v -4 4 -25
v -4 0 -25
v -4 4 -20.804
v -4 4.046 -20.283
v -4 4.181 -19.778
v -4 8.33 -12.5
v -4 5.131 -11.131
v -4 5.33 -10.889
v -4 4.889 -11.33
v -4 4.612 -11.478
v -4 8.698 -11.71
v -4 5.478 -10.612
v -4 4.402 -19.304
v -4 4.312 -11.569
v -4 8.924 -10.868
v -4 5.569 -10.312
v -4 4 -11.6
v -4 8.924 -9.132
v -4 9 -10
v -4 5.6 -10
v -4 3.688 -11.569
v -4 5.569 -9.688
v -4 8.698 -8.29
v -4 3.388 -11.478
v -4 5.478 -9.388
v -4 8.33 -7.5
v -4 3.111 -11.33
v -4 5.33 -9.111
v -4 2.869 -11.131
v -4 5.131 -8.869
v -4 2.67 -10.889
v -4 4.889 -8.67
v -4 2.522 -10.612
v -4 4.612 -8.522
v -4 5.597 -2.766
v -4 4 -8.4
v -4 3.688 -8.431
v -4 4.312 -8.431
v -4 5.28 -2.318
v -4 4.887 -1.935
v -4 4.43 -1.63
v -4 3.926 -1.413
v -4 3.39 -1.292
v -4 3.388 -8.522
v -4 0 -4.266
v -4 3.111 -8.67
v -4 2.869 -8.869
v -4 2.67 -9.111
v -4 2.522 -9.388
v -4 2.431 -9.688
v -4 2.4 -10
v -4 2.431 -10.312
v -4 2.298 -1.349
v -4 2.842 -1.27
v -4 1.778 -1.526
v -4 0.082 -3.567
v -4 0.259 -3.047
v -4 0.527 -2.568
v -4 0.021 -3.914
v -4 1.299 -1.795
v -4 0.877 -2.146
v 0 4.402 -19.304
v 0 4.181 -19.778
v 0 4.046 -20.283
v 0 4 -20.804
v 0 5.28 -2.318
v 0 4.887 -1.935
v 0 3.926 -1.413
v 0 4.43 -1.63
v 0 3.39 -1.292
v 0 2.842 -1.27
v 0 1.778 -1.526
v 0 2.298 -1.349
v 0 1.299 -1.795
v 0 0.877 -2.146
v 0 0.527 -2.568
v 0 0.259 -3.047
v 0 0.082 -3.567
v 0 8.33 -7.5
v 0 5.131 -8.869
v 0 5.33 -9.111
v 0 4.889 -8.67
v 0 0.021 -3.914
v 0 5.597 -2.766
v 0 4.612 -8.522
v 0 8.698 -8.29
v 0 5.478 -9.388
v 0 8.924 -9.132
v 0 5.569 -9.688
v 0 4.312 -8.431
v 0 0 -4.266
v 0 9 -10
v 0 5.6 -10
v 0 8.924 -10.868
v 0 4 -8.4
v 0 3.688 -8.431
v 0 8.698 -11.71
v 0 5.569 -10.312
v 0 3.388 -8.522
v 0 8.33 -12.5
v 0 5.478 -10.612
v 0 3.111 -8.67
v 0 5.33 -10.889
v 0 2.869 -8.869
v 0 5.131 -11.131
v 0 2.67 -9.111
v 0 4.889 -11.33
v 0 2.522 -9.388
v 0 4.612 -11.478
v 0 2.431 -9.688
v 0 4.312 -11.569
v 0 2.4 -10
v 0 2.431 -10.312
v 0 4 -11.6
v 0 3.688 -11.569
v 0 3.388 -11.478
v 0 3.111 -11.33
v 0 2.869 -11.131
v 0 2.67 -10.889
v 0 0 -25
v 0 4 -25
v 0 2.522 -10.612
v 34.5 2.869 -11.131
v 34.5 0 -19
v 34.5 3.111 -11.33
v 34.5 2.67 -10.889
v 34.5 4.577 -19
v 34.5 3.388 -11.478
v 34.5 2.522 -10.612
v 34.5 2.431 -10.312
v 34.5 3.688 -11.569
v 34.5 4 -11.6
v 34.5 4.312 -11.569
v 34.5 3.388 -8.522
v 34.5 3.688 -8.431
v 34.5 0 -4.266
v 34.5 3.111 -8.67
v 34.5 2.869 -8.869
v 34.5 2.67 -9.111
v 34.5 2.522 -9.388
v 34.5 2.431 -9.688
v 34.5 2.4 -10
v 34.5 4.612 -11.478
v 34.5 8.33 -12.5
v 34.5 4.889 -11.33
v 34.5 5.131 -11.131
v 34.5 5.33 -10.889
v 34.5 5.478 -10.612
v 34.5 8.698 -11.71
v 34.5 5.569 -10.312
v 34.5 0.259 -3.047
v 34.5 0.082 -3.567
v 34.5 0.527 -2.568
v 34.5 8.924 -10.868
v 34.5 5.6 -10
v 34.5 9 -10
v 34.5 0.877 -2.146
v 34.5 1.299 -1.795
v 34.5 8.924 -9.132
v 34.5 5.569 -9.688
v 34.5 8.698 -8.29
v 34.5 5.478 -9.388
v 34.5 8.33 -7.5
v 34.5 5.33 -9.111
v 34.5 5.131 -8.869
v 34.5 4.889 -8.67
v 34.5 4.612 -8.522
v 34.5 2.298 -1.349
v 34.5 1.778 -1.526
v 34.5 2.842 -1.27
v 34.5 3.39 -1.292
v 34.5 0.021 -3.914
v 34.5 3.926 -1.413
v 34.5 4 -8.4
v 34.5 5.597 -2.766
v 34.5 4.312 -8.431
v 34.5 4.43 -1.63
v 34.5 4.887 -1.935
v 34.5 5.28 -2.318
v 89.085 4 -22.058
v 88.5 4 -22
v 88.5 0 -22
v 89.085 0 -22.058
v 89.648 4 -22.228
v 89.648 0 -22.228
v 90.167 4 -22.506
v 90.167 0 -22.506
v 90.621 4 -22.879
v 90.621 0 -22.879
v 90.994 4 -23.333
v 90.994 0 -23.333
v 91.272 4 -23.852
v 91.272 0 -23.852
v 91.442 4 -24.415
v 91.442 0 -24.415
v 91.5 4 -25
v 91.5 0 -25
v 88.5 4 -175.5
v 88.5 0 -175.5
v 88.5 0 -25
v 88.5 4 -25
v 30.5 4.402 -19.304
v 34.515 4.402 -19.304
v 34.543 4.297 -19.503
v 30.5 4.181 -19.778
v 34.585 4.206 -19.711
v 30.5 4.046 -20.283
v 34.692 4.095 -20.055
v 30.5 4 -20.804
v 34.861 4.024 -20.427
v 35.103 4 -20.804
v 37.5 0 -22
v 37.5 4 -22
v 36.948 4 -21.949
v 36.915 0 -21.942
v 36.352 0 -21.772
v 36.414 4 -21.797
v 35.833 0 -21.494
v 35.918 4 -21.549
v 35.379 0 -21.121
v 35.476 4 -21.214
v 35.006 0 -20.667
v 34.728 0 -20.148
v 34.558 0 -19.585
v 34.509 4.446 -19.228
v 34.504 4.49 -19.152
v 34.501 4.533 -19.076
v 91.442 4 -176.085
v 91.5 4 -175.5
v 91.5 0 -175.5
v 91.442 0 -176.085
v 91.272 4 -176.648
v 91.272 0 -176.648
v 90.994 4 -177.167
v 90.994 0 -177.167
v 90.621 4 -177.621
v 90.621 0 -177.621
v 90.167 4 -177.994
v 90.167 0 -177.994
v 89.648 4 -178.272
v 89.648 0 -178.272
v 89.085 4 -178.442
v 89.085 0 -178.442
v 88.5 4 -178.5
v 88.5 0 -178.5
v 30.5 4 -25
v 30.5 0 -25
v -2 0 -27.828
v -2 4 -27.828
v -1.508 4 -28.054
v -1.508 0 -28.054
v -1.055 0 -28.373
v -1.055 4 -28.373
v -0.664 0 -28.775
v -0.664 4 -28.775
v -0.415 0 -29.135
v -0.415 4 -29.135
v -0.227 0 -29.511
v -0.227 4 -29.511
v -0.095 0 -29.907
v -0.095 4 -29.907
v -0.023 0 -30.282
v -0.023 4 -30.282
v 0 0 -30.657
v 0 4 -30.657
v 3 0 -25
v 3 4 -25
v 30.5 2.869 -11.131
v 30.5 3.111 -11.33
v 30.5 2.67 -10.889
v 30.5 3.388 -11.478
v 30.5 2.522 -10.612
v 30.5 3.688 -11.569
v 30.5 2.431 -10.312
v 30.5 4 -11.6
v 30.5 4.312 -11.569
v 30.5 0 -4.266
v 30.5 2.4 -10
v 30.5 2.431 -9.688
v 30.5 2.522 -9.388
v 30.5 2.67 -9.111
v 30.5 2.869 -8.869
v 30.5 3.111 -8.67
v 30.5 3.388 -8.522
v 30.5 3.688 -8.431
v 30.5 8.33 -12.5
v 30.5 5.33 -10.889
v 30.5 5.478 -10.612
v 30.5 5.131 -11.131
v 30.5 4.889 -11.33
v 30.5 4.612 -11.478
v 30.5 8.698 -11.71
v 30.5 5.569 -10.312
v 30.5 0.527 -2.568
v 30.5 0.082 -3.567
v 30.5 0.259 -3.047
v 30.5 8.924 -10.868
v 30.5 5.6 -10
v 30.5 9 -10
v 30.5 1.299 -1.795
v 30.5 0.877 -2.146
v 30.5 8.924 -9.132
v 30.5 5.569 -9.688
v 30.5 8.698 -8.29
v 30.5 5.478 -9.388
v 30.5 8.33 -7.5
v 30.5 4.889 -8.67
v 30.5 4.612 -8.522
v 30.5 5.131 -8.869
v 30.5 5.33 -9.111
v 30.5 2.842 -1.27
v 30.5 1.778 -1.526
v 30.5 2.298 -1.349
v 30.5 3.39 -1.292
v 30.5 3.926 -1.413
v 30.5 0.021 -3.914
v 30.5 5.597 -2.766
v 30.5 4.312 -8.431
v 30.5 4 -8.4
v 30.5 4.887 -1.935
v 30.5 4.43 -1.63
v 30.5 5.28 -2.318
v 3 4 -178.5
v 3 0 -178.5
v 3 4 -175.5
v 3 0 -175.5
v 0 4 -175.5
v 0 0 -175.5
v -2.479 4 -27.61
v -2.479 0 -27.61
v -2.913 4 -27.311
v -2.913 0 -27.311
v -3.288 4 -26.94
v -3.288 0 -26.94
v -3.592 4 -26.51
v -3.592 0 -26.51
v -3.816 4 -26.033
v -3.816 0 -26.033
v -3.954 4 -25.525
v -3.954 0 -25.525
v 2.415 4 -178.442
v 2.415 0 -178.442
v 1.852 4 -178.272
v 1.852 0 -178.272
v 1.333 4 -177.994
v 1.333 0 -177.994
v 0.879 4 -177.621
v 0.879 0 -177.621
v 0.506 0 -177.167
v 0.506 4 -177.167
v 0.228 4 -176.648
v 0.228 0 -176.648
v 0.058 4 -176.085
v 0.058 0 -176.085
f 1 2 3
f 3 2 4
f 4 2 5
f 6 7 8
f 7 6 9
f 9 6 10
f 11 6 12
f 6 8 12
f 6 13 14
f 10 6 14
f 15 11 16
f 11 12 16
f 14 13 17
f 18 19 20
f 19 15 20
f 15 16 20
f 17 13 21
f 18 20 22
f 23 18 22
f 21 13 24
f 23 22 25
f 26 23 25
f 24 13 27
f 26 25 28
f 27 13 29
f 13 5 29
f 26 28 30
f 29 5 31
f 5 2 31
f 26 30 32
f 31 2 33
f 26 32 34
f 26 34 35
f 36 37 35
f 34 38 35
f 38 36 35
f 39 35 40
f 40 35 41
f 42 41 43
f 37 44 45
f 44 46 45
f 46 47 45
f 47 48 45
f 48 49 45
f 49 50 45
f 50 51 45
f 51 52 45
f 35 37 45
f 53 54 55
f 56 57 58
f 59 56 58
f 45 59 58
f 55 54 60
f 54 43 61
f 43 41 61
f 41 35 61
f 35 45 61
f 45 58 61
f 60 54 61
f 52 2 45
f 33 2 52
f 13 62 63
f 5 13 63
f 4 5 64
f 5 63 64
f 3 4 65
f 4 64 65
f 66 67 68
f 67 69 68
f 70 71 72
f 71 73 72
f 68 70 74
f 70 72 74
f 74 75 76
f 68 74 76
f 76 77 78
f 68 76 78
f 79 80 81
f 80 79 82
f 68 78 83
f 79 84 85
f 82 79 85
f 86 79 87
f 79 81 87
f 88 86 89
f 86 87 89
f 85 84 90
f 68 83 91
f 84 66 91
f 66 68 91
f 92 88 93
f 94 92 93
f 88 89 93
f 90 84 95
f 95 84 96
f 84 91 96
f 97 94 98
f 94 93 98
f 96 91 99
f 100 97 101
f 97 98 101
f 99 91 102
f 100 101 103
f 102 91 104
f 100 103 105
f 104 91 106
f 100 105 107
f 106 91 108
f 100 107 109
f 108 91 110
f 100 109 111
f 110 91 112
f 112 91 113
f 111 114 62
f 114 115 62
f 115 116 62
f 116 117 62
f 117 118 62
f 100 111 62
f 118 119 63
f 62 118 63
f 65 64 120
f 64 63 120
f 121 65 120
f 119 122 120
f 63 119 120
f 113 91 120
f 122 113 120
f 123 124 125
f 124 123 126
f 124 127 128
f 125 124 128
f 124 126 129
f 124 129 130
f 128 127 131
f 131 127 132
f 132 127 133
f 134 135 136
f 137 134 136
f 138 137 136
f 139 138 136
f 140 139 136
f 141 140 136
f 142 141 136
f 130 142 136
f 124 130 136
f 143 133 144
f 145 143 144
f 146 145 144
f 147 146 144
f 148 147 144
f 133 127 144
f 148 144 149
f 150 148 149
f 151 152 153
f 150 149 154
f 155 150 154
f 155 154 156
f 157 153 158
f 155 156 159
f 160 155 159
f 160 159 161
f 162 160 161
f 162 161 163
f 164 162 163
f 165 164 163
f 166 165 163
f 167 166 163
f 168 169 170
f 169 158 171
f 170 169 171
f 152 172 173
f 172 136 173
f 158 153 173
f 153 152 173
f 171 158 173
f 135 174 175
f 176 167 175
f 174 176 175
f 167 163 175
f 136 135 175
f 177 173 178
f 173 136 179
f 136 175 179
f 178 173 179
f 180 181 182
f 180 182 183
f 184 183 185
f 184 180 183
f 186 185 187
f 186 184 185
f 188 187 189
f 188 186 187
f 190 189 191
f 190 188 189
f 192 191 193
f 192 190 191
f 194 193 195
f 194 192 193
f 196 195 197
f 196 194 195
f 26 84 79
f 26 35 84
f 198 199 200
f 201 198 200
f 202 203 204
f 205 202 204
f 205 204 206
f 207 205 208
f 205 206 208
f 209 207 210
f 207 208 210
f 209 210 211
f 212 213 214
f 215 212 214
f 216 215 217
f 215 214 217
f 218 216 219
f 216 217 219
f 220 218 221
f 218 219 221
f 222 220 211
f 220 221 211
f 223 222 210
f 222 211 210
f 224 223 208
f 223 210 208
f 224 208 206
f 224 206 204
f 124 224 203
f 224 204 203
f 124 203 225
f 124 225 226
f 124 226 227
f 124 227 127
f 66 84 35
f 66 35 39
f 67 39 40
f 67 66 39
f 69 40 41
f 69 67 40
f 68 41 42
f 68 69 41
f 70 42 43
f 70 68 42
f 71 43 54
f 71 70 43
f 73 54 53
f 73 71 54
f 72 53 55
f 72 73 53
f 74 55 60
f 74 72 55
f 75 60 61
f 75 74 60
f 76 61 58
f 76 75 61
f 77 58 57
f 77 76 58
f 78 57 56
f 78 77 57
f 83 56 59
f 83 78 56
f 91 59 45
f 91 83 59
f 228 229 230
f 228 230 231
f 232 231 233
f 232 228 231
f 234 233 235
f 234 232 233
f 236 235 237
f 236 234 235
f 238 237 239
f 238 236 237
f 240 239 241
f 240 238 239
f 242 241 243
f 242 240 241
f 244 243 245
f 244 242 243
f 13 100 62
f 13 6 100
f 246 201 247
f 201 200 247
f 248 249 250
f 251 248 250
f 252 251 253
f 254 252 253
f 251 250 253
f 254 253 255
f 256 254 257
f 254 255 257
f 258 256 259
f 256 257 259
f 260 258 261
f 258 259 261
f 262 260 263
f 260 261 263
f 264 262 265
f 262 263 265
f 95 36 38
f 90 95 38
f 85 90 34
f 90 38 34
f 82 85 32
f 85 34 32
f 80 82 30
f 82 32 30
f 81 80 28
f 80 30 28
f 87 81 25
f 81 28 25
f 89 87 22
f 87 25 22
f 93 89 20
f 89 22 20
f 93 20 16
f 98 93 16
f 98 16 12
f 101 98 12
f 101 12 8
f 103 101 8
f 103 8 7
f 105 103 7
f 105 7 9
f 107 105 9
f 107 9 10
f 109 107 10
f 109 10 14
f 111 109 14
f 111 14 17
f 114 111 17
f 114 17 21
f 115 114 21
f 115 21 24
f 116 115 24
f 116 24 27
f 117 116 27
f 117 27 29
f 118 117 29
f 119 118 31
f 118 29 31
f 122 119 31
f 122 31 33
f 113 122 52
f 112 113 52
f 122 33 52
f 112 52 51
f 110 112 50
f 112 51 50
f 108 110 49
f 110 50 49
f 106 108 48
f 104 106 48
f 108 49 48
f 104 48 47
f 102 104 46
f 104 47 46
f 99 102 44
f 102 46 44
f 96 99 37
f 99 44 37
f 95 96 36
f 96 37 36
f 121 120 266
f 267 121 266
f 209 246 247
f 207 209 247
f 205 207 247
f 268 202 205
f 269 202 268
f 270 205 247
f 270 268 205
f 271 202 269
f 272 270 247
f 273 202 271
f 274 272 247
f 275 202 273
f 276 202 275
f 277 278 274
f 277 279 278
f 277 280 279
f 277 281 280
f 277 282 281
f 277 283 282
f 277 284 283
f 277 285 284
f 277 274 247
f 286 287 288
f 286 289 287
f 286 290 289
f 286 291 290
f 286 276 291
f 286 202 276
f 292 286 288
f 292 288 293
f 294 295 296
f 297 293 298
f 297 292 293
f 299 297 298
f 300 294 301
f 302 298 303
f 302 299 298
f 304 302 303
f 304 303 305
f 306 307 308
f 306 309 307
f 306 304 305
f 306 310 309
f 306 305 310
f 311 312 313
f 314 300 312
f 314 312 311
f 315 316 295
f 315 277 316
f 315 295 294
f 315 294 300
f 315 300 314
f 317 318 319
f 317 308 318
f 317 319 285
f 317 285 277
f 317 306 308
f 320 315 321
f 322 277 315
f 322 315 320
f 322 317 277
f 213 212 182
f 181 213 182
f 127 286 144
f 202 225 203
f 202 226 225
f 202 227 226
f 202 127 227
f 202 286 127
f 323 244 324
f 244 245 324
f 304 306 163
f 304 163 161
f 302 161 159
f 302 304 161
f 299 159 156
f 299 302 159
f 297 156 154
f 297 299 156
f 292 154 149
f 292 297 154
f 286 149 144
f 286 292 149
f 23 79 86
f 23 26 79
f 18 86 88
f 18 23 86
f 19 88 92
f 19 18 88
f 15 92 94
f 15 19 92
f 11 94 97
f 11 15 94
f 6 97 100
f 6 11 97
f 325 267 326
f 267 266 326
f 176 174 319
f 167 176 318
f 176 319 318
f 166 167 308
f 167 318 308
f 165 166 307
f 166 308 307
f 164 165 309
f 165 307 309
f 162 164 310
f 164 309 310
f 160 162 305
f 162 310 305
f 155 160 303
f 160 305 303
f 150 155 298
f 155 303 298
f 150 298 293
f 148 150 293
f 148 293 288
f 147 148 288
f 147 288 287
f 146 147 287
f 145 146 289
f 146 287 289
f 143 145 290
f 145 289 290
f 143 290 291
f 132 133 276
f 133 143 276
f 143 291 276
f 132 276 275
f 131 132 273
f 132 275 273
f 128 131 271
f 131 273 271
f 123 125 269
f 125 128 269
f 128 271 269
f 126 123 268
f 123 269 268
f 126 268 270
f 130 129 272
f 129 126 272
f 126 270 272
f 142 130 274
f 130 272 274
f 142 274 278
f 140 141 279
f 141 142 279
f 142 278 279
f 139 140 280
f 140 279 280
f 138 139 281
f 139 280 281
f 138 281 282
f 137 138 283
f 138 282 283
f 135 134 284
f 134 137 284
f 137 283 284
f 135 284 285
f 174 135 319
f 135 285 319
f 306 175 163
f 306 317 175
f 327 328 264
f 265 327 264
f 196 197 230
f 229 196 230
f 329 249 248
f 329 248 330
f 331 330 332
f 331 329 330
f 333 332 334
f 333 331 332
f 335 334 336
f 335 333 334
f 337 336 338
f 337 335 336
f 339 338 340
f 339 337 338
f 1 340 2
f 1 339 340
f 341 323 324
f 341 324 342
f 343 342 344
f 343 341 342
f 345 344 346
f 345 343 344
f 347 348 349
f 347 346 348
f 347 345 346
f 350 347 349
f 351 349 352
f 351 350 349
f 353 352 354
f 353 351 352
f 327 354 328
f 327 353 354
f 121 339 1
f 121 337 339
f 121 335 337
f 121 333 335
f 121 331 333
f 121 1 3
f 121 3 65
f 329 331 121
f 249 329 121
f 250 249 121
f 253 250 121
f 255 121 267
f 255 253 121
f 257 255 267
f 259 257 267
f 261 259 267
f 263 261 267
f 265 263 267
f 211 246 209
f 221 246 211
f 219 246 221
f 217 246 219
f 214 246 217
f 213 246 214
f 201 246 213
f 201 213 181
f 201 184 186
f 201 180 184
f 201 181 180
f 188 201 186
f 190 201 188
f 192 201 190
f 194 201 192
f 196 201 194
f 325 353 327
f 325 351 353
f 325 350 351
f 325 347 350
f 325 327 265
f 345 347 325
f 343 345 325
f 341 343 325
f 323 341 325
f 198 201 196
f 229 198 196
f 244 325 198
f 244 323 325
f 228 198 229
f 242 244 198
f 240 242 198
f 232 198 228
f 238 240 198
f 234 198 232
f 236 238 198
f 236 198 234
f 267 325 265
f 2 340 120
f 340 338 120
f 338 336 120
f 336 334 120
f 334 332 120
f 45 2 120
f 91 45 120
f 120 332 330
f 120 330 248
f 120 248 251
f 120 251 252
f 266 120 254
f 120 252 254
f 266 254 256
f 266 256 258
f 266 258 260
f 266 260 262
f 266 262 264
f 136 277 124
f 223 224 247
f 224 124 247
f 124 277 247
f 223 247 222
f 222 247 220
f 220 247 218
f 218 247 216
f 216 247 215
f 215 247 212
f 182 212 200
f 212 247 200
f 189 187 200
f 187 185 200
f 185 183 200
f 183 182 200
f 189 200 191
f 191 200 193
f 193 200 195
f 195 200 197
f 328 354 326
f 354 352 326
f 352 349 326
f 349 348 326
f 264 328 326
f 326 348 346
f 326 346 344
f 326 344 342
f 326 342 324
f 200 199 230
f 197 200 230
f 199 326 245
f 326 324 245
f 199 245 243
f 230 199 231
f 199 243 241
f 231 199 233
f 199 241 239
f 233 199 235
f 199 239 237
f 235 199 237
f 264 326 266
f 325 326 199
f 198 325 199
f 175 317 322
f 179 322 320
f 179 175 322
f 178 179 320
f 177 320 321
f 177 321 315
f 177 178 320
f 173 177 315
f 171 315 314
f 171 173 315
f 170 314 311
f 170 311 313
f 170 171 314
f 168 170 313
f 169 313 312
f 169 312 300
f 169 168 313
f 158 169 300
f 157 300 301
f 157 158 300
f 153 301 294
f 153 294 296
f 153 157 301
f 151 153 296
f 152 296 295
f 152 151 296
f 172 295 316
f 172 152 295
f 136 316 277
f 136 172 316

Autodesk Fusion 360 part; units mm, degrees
sketch "Sketch1" plane through (0, 0, 0) normal (0, 1, 0) x (1, 0, 0)
  line L0 (0, 0) -> (0, 25)
  line L1 (0, 25) -> (3, 25)
  line L2 (3, 25) -> (3, 175.5)
  line L3 (3, 175.5) -> (88.5, 175.5)
  line L4 (88.5, 175.5) -> (88.5, 25)
  line L5 (88.5, 25) -> (30.5, 25)
  line L6 (30.5, 25) -> (30.5, 0)
  line L7 (30.5, 0) -> (34.5, 0)
  line L8 (34.5, 0) -> (34.5, 22)
  line L9 (34.5, 22) -> (91.5, 22)
  line L10 (91.5, 22) -> (91.5, 178.5)
  line L11 (91.5, 178.5) -> (0, 178.5)
  line L12 (0, 178.5) -> (0, 28)
  line L13 (0, 28) -> (-4, 28)
  line L14 (-4, 28) -> (-4, 0)
  line L15 (-4, 0) -> (0, 0)
  dimension "d1" = 4
  dimension "d2" = 3
  dimension "d3" = 3
  dimension "d4" = 3
  dimension "d5" = 3
  dimension "d6" = 3
  dimension "d7" = 4
  dimension "d8" = 85.5
  dimension "d9" = 150.5
  dimension "d10" = 25
  dimension "d11" = 25
  dimension "d12" = 3
  dimension "d13" = 30.5
extrude "Extrude1" add sketch "Sketch1" along normal blind 4
sketch "Sketch2" plane through (-4, 0, 0) normal (-1, 0, 0) x (0, 0, 1)
  line L0 (-28, 0) -> (0, 0)
  line L1 (0, 0) -> (0, 4)
  line L2 (0, 4) -> (-28, 4)
  line L3 (-28, 4) -> (-28, 0)
  line L4 (-25, 0) -> (-25, 4)
  circle A0 centre (-10, 4) radius 1.6
  line L5 (0, 4) -> (-7.5, 8.3301)
  line L6 (-12.5, 8.3301) -> (-20, 4)
  arc A1 (-7.5, 8.3301) -> (-12.5, 8.3301) centre (-10, 4) ccw
  point P0 (-25, 2)
  dimension "d16" = 3.2
  dimension "d17" = 10
  dimension "d18" = 2
  dimension "d19" = 15
  dimension "d20" = 30
extrude "Extrude2" add sketch "Sketch2" against normal up to surface (4 mm away) contours L2 A0 L5 L6 A1
extrude "Extrude3" add sketch "Sketch2" against normal up to surface (4 mm away) from surface at -34.5 contours L2 A0 L5 L6 A1
extrude "Extrude4" cut sketch "Sketch2" against normal through all contours L2 A0 picked at (-9.8813, 3.48)
fillet "Fillet1" radius 3 12 edges at (-2, 4, -20) (32.5, 4, -20) (32.5, 4, 0) (32.5, 0, 0) (-2, 4, 0) (-2, 0, 0) (-4, 2, -28) (0, 2, -28) (0, 2, -178.5) (91.5, 2, -178.5) (91.5, 2, -22) (34.5, 2, -22)
equation "d2 = d4"
equation "d3 = d4"
equation "d5 = d4"
equation "d6 = d4"
